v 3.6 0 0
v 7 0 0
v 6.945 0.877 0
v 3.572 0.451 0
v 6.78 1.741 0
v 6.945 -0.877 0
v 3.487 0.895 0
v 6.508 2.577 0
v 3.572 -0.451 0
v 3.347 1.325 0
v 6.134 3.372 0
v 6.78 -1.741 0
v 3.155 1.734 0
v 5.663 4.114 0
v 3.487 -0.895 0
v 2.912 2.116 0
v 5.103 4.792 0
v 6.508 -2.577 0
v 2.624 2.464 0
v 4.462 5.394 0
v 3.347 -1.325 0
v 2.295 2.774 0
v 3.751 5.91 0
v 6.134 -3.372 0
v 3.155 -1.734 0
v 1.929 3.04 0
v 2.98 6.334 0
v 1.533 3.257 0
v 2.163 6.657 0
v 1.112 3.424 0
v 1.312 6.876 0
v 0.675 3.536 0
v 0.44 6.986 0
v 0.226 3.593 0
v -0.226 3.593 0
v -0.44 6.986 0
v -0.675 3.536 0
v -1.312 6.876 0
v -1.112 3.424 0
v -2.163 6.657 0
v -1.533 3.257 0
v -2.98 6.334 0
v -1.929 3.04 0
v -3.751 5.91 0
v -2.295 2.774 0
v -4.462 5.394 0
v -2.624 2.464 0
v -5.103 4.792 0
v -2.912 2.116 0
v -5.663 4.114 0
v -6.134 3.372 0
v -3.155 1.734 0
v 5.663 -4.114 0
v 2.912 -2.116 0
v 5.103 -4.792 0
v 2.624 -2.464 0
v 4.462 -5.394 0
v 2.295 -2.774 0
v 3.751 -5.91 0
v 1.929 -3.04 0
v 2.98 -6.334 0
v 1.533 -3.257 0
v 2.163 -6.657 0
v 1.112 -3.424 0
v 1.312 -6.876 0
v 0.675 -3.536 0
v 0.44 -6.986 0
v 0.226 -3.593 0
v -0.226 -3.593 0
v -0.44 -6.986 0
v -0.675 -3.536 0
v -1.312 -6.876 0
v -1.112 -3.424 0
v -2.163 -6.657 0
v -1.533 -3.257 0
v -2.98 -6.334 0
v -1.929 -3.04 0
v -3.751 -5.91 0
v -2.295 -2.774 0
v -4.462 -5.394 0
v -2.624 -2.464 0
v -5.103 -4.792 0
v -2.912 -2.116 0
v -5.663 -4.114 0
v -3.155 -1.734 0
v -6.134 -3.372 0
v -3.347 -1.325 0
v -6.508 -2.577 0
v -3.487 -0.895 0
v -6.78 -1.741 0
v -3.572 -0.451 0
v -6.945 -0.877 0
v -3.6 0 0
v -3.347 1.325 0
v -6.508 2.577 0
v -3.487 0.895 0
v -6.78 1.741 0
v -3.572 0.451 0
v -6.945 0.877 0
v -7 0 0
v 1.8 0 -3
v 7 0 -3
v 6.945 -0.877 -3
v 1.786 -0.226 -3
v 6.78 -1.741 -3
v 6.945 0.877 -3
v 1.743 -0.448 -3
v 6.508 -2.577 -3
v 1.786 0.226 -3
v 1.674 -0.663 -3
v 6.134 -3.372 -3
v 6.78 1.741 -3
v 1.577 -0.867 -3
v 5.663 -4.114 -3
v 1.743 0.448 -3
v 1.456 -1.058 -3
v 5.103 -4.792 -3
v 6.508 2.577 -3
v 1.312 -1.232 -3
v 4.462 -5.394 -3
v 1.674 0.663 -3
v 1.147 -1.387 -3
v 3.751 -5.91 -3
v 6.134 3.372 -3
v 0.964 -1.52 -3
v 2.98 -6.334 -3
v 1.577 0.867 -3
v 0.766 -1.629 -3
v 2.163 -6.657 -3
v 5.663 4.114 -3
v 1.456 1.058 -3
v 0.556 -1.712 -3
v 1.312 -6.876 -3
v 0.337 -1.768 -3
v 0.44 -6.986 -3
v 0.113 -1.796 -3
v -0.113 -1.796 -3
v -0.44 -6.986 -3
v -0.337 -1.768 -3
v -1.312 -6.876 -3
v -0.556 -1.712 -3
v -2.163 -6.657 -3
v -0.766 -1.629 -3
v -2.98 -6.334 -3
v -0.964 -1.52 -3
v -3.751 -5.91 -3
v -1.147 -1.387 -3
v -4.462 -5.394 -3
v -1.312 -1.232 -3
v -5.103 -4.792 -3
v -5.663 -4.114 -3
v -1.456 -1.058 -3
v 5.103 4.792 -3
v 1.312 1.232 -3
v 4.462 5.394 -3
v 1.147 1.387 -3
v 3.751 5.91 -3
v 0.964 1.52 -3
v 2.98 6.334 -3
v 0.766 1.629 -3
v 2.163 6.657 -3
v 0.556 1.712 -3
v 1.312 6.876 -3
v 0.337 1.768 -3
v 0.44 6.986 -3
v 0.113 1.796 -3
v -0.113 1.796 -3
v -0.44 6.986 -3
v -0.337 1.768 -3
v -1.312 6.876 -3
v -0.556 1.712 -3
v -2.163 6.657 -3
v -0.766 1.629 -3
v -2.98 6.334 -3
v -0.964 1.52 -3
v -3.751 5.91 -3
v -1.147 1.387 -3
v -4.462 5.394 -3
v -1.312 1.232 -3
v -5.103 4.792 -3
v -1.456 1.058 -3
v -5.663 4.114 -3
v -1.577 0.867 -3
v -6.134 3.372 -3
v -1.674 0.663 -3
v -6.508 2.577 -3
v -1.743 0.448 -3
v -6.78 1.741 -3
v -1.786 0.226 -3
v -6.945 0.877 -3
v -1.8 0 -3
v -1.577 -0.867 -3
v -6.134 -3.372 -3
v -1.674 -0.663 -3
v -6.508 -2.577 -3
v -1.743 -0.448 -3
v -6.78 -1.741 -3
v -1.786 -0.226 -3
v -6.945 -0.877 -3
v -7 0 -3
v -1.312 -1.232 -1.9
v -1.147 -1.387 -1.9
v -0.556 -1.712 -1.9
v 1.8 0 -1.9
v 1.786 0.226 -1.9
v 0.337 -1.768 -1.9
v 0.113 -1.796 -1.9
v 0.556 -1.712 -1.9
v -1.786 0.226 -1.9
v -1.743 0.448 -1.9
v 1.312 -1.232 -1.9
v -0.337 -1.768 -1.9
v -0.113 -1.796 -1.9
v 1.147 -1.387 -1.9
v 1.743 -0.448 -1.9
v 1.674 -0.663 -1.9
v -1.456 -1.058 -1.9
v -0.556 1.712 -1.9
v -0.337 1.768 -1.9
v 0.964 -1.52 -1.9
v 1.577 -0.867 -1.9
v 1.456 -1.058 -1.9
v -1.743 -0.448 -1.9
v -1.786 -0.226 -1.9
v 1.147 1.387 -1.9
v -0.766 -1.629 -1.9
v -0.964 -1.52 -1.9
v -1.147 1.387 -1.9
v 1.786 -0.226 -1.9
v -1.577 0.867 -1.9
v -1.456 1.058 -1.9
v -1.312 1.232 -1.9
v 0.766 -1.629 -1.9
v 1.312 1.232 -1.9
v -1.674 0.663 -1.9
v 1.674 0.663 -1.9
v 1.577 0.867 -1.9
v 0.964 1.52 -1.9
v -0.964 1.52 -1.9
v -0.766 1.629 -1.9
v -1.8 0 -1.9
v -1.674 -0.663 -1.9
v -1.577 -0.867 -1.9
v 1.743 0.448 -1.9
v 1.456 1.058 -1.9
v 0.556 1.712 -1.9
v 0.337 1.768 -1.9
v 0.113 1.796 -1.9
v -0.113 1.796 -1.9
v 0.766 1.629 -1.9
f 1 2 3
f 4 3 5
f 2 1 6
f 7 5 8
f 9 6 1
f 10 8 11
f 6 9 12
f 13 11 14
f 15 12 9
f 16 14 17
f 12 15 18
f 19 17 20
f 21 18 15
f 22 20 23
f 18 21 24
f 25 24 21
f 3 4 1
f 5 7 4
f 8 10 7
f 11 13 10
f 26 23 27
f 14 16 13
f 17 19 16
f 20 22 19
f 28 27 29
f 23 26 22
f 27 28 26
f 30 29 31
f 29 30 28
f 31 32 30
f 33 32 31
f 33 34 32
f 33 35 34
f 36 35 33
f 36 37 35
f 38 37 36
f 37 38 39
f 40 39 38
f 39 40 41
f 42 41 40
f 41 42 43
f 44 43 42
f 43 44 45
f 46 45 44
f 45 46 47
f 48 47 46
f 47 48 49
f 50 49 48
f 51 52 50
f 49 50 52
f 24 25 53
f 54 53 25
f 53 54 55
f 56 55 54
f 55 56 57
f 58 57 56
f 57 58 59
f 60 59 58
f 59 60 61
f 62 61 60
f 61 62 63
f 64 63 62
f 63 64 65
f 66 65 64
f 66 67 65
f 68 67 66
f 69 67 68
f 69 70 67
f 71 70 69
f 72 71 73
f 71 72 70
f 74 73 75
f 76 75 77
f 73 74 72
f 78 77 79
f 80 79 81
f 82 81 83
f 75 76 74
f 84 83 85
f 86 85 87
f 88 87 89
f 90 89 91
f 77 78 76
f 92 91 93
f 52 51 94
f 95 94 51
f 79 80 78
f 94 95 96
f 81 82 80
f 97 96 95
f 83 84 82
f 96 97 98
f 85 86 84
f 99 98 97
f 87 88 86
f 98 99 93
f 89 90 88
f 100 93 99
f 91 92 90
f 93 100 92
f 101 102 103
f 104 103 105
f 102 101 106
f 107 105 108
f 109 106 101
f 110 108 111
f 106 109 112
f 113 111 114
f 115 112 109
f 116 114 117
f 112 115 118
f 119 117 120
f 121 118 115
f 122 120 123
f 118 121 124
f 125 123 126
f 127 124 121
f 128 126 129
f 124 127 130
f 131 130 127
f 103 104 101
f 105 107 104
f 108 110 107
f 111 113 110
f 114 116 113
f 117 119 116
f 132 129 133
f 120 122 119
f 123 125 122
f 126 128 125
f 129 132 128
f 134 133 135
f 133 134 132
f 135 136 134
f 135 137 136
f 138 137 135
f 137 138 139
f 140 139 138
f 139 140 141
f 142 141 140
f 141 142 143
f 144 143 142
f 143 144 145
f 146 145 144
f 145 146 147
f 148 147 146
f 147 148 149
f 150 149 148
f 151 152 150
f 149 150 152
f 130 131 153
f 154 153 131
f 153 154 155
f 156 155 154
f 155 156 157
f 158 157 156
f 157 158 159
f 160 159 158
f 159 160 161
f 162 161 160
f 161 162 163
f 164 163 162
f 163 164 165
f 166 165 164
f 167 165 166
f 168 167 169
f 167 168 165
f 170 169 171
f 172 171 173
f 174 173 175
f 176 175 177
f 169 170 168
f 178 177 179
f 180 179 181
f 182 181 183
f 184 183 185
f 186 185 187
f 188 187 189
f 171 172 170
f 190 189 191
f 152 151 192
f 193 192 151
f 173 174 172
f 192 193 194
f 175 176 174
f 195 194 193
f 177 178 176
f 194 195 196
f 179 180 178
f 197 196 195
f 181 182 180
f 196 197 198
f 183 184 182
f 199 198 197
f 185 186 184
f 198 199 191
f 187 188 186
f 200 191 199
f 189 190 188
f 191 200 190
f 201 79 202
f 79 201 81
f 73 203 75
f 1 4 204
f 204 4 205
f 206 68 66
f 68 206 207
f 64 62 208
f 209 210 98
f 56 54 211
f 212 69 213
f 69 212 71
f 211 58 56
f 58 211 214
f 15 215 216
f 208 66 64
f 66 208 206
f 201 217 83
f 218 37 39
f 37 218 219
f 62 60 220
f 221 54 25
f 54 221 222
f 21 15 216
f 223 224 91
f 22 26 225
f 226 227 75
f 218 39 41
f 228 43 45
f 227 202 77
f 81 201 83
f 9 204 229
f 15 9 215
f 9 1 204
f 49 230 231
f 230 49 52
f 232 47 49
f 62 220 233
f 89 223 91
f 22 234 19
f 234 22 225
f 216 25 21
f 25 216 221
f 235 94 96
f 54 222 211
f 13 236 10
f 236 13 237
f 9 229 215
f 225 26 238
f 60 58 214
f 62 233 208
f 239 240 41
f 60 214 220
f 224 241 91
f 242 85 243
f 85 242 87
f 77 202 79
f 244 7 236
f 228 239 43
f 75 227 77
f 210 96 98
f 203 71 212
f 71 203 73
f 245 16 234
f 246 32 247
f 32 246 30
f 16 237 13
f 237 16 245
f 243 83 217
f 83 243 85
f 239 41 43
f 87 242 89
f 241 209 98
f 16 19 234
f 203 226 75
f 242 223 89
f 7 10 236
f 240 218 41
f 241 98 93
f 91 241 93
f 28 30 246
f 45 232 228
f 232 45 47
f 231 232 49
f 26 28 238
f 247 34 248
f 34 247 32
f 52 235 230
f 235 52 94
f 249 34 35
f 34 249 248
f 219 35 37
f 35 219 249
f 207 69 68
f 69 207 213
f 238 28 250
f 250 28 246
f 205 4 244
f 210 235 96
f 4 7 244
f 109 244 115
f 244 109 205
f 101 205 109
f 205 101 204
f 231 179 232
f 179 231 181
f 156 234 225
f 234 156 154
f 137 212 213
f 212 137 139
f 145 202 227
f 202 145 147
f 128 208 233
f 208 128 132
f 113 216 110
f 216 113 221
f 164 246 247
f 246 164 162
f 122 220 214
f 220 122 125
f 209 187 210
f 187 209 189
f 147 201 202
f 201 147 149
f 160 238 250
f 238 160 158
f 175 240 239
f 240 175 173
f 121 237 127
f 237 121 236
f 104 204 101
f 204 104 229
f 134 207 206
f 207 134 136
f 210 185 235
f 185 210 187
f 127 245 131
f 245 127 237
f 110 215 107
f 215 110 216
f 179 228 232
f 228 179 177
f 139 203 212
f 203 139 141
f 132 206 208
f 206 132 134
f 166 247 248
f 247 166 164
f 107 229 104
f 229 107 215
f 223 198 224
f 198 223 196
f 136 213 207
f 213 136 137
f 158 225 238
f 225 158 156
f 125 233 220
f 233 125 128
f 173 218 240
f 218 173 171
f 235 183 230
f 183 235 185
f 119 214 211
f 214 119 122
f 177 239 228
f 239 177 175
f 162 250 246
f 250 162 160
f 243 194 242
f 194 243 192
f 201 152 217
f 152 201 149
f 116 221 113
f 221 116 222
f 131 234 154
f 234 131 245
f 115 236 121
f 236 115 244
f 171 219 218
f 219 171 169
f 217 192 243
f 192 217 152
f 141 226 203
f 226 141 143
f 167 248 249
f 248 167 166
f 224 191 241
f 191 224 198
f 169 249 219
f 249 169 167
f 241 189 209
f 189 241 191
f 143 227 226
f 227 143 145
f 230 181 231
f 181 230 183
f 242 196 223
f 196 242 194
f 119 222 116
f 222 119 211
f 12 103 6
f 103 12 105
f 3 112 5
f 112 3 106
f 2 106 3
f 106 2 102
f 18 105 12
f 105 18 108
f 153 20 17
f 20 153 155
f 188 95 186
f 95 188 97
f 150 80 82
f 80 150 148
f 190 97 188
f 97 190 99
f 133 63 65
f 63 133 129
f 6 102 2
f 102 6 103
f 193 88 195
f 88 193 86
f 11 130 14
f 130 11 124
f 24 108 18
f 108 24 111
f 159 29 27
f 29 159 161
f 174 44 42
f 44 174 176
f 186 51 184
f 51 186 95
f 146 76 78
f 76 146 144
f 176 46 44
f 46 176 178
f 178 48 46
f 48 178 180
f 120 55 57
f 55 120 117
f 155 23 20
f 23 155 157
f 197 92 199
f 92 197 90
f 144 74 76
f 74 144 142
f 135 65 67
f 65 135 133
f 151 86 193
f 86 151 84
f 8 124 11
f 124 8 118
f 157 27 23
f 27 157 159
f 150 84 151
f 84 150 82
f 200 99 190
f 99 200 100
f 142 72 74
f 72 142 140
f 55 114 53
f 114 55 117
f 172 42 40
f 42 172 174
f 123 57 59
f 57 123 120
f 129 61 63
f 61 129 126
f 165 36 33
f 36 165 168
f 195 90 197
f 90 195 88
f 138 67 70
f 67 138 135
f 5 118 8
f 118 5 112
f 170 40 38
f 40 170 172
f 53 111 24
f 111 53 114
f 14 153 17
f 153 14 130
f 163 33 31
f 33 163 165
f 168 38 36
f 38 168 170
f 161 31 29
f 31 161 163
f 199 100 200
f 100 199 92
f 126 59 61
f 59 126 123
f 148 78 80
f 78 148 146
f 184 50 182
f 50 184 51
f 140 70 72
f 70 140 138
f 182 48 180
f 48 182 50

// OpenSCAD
$fn = 50;


difference() {
	union() {
		translate(v = [0, 0, -3.0000000000]) {
			cylinder(h = 3, r = 7.0000000000);
		}
	}
	union() {
		translate(v = [0, 0, 0]) {
			rotate(a = [0, 0, 0]) {
				difference() {
					union() {
						translate(v = [0, 0, -3.0000000000]) {
							cylinder(h = 3, r = 1.5000000000);
						}
						translate(v = [0, 0, -1.9000000000]) {
							cylinder(h = 1.9000000000, r1 = 1.8000000000, r2 = 3.6000000000);
						}
						translate(v = [0, 0, -3.0000000000]) {
							cylinder(h = 3, r = 1.8000000000);
						}
						translate(v = [0, 0, -3.0000000000]) {
							cylinder(h = 3, r = 1.5000000000);
						}
					}
					union();
				}
			}
		}
	}
}
